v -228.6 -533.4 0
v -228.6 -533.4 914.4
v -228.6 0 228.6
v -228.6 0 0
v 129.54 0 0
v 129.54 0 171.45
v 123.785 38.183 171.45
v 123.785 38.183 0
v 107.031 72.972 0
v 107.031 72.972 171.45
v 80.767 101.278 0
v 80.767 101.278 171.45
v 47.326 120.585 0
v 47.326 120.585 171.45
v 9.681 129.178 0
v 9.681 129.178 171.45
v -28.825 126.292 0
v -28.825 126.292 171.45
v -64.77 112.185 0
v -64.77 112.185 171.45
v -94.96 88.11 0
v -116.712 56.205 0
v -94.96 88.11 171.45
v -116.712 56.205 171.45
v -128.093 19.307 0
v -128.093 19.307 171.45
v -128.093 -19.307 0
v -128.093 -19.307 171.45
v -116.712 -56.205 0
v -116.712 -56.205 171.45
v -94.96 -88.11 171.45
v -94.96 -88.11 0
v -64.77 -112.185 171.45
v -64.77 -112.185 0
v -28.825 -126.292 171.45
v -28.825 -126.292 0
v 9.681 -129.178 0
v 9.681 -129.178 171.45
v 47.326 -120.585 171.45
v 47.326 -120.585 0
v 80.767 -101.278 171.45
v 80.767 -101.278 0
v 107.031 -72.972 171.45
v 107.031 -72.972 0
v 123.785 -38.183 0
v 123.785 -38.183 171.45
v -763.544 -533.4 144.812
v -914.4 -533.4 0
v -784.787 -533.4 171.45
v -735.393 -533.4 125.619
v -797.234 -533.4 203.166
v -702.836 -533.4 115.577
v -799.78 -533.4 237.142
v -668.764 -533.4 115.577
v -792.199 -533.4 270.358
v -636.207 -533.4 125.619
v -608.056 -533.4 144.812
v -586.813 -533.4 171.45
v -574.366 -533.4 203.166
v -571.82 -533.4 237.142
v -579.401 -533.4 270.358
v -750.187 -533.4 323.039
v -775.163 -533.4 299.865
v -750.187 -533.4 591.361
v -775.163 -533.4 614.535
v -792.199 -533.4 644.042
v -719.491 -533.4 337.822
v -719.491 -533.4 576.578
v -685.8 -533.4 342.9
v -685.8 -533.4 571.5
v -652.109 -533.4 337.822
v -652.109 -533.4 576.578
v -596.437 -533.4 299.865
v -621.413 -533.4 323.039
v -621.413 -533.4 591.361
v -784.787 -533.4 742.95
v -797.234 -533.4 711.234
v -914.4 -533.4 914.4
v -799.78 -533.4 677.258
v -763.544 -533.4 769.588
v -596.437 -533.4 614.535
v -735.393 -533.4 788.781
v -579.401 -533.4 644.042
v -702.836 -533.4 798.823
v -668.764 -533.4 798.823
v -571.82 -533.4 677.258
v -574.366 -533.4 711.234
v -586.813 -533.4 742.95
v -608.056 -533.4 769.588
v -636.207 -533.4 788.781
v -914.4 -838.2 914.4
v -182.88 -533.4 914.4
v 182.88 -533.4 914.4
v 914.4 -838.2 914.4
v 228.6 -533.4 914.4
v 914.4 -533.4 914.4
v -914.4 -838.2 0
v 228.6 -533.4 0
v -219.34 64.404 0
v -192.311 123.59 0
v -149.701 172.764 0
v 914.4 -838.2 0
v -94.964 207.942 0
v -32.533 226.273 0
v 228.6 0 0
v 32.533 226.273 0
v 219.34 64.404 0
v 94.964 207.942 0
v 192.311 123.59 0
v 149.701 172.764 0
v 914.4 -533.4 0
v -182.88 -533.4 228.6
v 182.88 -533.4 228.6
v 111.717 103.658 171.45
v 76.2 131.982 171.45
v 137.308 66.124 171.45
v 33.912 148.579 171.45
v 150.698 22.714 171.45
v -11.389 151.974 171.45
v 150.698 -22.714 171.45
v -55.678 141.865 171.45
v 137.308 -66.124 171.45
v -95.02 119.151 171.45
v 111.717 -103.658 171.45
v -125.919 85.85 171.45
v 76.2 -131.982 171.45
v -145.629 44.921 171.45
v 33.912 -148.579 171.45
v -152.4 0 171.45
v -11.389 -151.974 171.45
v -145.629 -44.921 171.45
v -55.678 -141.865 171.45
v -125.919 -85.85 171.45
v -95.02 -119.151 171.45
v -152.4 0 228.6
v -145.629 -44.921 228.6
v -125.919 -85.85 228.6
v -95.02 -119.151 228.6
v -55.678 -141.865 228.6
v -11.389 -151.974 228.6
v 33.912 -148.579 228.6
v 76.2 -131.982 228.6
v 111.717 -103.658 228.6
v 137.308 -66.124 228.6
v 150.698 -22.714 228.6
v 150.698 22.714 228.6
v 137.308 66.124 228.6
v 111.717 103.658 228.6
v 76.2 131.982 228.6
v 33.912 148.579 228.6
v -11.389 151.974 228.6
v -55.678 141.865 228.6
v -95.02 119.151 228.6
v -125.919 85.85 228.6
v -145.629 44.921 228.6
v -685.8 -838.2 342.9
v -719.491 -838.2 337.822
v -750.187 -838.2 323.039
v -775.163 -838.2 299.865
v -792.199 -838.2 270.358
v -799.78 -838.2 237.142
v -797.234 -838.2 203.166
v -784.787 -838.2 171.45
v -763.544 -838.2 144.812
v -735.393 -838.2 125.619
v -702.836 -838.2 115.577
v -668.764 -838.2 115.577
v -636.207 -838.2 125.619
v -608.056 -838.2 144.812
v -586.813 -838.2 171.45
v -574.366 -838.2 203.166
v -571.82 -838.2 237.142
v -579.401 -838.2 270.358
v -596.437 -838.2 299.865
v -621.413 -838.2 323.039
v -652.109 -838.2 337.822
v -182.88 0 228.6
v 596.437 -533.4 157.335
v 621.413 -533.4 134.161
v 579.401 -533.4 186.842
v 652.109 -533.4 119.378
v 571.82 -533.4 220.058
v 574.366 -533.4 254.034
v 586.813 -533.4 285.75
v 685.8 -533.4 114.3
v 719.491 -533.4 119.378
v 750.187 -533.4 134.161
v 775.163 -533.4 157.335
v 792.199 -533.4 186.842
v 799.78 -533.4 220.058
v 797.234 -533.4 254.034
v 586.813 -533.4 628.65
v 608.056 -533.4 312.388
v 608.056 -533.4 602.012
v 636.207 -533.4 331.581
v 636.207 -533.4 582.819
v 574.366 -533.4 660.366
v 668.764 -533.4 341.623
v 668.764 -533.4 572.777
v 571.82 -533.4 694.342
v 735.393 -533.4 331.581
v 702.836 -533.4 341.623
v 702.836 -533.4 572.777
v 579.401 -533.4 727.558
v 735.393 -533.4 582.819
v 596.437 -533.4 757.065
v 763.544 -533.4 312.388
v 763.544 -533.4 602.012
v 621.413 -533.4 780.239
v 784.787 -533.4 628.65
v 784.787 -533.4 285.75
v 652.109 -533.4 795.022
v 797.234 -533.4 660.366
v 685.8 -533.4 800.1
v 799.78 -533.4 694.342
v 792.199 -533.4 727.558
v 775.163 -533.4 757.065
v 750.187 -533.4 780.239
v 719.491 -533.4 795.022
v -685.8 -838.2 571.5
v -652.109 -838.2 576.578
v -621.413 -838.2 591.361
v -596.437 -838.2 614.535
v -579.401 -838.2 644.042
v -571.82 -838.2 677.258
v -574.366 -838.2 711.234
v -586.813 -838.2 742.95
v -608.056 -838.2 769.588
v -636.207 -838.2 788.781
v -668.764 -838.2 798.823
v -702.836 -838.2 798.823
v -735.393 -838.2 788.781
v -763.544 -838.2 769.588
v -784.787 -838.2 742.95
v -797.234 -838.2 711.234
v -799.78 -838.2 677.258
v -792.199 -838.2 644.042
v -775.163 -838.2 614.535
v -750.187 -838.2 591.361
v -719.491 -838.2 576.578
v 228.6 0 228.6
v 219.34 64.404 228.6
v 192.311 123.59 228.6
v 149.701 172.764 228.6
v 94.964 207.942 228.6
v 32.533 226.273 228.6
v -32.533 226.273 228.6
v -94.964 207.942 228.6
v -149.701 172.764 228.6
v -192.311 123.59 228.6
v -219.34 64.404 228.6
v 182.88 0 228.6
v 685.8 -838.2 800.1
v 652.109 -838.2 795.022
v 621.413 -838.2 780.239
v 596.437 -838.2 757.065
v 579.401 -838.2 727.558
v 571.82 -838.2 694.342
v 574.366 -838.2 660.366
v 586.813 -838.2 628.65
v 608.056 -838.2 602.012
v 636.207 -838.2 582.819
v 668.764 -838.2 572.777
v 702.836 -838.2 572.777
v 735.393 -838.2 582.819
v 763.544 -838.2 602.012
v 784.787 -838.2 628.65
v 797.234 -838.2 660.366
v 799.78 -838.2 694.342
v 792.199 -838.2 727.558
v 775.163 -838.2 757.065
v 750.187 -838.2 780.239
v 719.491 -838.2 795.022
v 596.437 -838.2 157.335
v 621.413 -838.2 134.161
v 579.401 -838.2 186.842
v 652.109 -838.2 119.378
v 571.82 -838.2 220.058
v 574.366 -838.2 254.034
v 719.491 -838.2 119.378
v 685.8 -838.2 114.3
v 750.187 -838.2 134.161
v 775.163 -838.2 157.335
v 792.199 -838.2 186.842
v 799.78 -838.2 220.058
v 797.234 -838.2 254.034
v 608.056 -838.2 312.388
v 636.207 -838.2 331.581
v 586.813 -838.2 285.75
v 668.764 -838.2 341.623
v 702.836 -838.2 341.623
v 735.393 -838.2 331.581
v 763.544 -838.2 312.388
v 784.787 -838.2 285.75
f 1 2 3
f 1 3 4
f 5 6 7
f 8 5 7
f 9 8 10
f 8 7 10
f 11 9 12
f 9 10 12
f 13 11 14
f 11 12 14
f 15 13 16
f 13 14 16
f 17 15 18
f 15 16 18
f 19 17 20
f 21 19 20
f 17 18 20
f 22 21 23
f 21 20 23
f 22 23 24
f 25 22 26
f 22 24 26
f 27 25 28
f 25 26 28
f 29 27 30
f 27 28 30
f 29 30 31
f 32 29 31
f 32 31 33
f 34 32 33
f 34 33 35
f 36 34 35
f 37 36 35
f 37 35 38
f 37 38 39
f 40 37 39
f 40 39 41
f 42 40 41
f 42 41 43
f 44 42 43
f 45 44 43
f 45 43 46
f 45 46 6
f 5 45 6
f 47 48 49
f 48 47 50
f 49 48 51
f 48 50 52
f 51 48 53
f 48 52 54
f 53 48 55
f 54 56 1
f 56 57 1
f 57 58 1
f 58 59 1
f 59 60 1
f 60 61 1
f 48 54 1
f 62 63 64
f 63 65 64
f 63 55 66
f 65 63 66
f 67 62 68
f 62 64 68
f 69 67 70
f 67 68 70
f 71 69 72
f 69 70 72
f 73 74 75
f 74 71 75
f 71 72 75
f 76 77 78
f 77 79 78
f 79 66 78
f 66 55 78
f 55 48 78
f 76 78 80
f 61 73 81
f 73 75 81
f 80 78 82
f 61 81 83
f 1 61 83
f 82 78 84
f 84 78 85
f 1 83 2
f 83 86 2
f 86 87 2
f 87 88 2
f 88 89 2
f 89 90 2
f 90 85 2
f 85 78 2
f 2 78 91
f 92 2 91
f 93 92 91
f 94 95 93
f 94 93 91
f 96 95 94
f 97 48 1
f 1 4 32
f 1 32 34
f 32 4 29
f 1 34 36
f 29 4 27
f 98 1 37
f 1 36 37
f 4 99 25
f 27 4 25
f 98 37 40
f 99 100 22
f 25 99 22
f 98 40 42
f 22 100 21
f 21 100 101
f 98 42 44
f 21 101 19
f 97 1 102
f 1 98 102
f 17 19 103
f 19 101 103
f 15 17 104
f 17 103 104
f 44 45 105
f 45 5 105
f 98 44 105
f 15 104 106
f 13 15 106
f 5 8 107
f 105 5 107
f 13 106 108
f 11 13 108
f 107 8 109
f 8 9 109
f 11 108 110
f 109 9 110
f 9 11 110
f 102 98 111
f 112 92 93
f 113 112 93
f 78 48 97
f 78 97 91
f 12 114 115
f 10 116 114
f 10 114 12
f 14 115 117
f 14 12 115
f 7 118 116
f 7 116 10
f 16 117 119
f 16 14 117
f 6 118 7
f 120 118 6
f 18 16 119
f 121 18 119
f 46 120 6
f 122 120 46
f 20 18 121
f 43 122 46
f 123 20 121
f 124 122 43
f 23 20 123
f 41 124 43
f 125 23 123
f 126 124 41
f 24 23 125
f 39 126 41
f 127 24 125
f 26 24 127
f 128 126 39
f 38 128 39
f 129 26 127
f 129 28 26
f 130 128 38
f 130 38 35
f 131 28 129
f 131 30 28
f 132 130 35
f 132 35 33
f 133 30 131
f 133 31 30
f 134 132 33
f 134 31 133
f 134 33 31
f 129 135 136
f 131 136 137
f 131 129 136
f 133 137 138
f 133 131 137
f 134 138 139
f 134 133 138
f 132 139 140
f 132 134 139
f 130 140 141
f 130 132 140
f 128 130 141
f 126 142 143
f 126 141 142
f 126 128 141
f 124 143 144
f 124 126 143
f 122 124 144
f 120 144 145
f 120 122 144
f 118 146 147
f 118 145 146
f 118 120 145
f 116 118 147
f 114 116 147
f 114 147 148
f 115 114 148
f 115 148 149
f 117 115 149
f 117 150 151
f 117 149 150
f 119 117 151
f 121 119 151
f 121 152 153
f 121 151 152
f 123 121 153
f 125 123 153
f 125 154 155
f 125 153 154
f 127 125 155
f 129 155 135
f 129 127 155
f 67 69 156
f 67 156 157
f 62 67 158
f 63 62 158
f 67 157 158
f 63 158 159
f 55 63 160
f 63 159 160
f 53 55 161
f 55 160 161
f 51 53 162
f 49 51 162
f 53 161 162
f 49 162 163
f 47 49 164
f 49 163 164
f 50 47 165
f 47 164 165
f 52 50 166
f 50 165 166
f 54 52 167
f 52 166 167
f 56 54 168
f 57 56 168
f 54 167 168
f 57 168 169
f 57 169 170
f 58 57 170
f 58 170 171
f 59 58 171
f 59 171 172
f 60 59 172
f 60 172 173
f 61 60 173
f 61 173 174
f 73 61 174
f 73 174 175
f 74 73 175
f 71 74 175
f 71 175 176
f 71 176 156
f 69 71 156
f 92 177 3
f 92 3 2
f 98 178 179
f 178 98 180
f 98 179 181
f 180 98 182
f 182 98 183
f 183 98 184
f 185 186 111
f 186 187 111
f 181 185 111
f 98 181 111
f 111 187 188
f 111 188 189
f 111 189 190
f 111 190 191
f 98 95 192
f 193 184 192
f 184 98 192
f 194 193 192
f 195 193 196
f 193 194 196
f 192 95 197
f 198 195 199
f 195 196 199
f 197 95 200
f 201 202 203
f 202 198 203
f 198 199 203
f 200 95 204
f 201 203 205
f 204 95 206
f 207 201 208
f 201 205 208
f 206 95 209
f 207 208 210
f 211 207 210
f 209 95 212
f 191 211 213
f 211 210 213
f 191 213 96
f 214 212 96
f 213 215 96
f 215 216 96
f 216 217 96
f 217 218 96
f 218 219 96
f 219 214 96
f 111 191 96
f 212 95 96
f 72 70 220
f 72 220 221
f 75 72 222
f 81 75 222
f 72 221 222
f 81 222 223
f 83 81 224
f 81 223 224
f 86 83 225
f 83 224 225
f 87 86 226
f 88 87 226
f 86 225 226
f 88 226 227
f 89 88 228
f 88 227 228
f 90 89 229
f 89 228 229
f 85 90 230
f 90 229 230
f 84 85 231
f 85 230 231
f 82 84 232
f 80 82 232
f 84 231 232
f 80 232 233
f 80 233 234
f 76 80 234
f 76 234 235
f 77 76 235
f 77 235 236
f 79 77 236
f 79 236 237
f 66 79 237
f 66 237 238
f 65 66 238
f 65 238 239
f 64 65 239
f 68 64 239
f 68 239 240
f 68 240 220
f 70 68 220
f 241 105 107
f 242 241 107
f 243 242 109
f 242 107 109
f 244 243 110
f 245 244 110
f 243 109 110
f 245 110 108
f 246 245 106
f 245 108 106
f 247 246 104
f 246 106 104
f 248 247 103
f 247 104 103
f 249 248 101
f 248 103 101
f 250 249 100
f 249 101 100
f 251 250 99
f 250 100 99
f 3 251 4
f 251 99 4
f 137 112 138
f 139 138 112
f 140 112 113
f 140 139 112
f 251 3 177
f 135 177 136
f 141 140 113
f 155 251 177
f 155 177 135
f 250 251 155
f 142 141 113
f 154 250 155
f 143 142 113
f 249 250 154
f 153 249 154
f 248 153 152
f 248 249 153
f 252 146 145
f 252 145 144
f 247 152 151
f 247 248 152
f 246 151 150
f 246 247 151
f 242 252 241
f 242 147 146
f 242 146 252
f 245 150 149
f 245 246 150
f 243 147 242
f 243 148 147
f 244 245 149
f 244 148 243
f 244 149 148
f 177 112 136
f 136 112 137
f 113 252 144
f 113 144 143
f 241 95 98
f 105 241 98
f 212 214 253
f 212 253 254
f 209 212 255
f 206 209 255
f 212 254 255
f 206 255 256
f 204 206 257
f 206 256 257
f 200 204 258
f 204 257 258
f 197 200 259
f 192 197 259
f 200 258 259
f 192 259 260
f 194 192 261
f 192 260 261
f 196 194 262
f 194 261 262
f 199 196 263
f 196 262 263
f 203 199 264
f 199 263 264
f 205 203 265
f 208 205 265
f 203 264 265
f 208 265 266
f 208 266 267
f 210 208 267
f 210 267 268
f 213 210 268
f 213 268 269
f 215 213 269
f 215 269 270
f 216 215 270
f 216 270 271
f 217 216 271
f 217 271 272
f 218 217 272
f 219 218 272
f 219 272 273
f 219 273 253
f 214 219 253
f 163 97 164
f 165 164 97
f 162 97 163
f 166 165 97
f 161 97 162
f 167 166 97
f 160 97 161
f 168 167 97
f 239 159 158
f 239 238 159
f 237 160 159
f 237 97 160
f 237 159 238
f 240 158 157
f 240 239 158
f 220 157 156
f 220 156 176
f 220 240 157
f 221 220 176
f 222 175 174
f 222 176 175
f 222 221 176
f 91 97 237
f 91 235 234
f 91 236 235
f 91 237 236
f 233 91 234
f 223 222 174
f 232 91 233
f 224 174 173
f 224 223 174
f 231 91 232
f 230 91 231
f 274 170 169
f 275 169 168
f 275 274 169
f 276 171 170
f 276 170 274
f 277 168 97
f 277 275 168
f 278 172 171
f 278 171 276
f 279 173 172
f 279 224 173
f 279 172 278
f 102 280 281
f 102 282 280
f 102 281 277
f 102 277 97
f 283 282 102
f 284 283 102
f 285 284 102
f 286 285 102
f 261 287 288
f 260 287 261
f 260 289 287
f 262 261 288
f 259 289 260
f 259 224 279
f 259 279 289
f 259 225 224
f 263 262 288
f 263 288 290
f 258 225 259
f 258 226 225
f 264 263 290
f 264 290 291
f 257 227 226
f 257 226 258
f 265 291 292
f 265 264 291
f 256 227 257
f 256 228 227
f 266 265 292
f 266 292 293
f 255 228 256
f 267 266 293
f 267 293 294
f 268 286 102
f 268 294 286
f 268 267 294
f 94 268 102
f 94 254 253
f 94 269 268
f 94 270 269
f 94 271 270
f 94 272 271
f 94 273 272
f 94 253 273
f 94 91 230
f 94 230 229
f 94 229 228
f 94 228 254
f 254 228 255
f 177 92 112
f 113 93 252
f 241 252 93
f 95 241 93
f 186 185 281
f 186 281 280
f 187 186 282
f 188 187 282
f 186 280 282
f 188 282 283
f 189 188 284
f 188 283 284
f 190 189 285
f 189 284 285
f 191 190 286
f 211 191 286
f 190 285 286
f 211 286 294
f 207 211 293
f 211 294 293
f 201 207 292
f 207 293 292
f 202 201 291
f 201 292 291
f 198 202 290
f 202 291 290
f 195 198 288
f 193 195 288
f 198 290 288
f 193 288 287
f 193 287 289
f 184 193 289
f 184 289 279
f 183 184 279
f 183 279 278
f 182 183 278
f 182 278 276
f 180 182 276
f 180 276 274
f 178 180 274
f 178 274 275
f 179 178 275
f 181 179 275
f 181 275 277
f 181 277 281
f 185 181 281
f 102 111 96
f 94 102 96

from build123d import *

# Parameters (mm, degrees)
EXTRUDE_1_DEPTH          = 228.6
CUT_EXTRUDE_1_DEPTH      = 624.723881217
CUT_EXTRUDE_1_DEPTH_BACK = 57.15
SKETCH_2_R               = 152.4
SKETCH_2_R_2             = 129.54
SKETCH_3_R               = 129.54
CUT_EXTRUDE_2_DEPTH      = 624.723881217
SKETCH_4_W               = 1828.8
SKETCH_4_H               = 914.4
EXTRUDE_2_DEPTH          = 304.8
RIB_START                = -45.72
RIB_11_DEPTH             = 45.72
SKETCH_6_R               = 114.3
CUT_EXTRUDE_3_DEPTH      = 1677.4


# Read off the part's stored shape, not the designer's step: 筋11
with BuildPart() as part:
    # 草图1 → 凸台-拉伸1 (new body)
    with BuildSketch(Plane.XY):
        with BuildLine():
            Line((-228.6, 0), (-228.6, -533.4))
            Line((-228.6, -533.4), (228.6, -533.4))
            Line((228.6, -533.4), (228.6, 0))
            ThreePointArc((228.6, 0), (0, 228.6), (-228.6, 0))
        make_face()
    extrude(amount=EXTRUDE_1_DEPTH)

    # 草图2 → 切除-拉伸1 (cut, two sides: drawn at the far end of the back side and taken through both)
    with BuildSketch(Plane.XY.offset(228.6).offset(-CUT_EXTRUDE_1_DEPTH_BACK)):
        with Locations(Location((0, 0, 0), (0, 0, 180))):
            Circle(SKETCH_2_R)
        with Locations(Location((0, 0, 0), (0, 0, 180))):
            Circle(SKETCH_2_R_2, mode=Mode.SUBTRACT)
    extrude(amount=CUT_EXTRUDE_1_DEPTH + CUT_EXTRUDE_1_DEPTH_BACK, mode=Mode.SUBTRACT)

    # 草图3 → 切除-拉伸2 (cut, through all)
    with BuildSketch(Plane.XY.offset(228.6)):
        Circle(SKETCH_3_R)
    extrude(amount=-CUT_EXTRUDE_2_DEPTH, mode=Mode.SUBTRACT)

    # 草图4 → 凸台-拉伸2 (add)
    with BuildSketch(Plane.XZ.offset(533.4)):
        with Locations((0, 457.2)):
            Rectangle(SKETCH_4_W, SKETCH_4_H)
    extrude(amount=EXTRUDE_2_DEPTH)

    # 筋11 outline → 筋11 (add)
    with BuildSketch(Plane(origin=(228.6, 0, 0), x_dir=(0, 0, -1), z_dir=(1, 0, 0)).offset(RIB_START)):
        Polygon((-228.6, -533.4), (-228.6, 0), (-914.4, -533.4), align=None)
    rib_11 = extrude(amount=RIB_11_DEPTH)

    # 镜向1: 筋11 across plane
    add(rib_11.mirror(Plane(origin=(0, 0, 0), x_dir=(0, 0, 1), z_dir=(1, 0, 0))))

    # 草图6 → 切除-拉伸3 (cut, through all)
    with BuildSketch(Plane.XZ.offset(838.2)):
        with Locations(Location((-685.8, 685.8, 0), (0, 0, 270))):
            Circle(SKETCH_6_R)
        with Locations(Location((-685.8, 228.6, 0), (0, 0, 90))):
            Circle(SKETCH_6_R)
        with Locations(Location((685.8, 228.6, 0), (0, 0, 270))):
            Circle(SKETCH_6_R)
        with Locations(Location((685.8, 685.8, 0), (0, 0, 90))):
            Circle(SKETCH_6_R)
    extrude(amount=-CUT_EXTRUDE_3_DEPTH, mode=Mode.SUBTRACT)


solid = part.part
